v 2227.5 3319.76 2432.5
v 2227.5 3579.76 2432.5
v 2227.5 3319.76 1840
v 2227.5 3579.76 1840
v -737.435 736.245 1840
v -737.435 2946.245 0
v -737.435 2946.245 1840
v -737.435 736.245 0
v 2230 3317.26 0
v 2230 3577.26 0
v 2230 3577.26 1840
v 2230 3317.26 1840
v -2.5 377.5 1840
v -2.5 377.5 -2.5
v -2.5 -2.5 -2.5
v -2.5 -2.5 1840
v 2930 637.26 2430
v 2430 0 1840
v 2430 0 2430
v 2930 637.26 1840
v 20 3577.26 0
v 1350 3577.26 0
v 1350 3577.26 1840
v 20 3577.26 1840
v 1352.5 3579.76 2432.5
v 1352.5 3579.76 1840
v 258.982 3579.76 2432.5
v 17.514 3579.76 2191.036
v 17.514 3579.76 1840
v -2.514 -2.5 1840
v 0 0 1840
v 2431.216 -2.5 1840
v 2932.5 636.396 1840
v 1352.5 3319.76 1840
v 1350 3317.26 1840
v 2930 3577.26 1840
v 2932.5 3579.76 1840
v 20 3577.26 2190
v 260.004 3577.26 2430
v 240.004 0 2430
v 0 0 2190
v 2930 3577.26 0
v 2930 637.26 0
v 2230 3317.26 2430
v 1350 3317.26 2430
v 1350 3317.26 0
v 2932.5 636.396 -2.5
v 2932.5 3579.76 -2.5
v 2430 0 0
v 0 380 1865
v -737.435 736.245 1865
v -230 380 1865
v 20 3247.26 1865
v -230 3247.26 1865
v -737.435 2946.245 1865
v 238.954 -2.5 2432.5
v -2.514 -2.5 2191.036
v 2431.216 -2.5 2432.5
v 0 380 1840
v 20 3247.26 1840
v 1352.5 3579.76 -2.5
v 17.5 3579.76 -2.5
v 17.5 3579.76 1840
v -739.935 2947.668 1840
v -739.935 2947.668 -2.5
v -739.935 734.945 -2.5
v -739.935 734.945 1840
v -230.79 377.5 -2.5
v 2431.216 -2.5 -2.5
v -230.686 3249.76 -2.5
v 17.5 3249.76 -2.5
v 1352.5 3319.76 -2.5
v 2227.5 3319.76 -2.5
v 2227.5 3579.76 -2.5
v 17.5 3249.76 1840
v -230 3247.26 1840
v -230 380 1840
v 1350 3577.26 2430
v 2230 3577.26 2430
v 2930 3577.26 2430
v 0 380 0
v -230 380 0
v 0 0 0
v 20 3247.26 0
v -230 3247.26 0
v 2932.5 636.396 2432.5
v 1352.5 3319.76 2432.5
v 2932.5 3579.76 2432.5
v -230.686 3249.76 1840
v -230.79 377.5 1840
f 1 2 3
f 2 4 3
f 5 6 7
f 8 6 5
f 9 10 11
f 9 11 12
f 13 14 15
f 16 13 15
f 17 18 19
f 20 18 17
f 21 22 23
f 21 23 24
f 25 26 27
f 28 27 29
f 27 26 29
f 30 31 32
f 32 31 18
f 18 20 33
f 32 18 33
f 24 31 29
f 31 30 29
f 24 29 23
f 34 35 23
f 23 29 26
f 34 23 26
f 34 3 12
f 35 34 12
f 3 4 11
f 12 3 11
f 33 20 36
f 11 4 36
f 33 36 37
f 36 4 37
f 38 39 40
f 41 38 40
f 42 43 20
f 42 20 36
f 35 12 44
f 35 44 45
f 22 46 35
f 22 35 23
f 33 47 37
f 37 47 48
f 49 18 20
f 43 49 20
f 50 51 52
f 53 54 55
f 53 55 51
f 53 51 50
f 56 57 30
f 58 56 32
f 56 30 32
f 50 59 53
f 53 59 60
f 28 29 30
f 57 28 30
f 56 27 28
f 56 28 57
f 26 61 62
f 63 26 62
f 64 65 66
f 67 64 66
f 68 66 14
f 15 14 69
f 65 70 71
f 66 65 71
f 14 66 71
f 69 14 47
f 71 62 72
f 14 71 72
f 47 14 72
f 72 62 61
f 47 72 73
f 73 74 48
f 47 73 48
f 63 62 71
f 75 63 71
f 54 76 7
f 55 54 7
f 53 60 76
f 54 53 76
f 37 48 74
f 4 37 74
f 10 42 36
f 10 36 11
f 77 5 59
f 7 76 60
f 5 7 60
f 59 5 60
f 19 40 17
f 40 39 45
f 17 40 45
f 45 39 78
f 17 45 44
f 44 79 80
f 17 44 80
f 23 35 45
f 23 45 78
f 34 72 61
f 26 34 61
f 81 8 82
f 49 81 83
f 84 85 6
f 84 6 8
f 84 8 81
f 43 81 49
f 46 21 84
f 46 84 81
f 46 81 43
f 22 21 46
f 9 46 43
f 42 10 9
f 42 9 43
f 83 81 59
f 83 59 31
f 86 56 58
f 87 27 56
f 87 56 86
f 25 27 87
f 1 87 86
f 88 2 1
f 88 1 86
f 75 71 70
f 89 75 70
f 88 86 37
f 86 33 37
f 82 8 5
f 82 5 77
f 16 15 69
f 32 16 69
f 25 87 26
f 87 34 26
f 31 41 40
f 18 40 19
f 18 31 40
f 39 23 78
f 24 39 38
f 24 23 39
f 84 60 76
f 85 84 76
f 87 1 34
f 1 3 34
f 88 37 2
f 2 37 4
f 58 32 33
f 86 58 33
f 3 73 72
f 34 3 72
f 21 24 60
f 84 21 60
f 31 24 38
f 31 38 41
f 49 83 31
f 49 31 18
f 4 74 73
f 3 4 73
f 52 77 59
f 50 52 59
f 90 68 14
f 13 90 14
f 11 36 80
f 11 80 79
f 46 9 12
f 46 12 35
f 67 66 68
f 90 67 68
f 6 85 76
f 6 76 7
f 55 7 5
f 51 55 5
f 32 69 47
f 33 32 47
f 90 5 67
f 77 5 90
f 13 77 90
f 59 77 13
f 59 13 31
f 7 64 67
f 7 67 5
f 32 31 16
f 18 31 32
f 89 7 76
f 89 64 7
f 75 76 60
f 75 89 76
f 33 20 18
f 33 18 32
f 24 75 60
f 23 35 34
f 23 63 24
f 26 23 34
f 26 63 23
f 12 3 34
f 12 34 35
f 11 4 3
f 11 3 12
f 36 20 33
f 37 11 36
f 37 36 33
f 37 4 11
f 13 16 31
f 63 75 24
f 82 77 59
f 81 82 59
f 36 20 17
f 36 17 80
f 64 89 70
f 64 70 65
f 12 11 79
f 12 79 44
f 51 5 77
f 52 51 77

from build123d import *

# Parameters (mm, degrees)
F1_DEPTH = 1840
F3_DEPTH = 25
F5_DEPTH = 590
F6_SIZE2 = 240
F6_SIZE  = 240
F7_T     = 2.5
F8_T     = 2.5


with BuildPart() as f1:
    # F0 (on Top) → F1 (new body)
    with BuildSketch(Plane.XY):
        Polygon((0, 380), (0, 0), (2430, 0), (2930, 637.2597586542), (2930, 3577.2597586542), (2230, 3577.2597586542), (2230, 3317.2597586542), (1350, 3317.2597586542), (1350, 3577.2597586542), (20, 3577.2597586542), (20, 3247.2597586542), (-230, 3247.2597586542), (-737.4345606747, 2946.2445320744), (-737.4345606747, 736.2445320744), (-230, 380), align=None)
    extrude(amount=F1_DEPTH)

    # F7
    f7_openings = [f1.faces().sort_by_distance(p)[0] for p in [
        (1148.423993, 1782.531794, 1840),
    ]]
    offset(amount=F7_T, openings=f7_openings, kind=Kind.INTERSECTION)


with BuildPart() as f3:
    # F2 (on face) → F3 (new body)
    with BuildSketch(Plane.XY.offset(1840)):
        Polygon((0, 380), (20, 3247.2597586542), (-230, 3247.2597586542), (-737.4345606747, 2946.2445320744), (-737.4345606747, 736.2445320744), (-230, 380), align=None)
    extrude(amount=F3_DEPTH)


with BuildPart() as f5:
    # F4 (on face) → F5 (new body)
    with BuildSketch(Plane.XY.offset(1840)):
        Polygon((20, 3577.2597586542), (0, 0), (2430, 0), (2930, 637.2597586542), (2930, 3577.2597586542), (2230, 3577.2597586542), (2230, 3317.2597586542), (1350, 3317.2597586542), (1350, 3577.2597586542), align=None)
    extrude(amount=F5_DEPTH)

    # F6
    f6_edges = [f5.edges().sort_by_distance(p)[0] for p in [
        (10, 1788.629879, 2430),
    ]]
    chamfer(f6_edges, length=F6_SIZE, length2=F6_SIZE2)

    # F8
    f8_openings = [f5.faces().sort_by_distance(p)[0] for p in [
        (1442.227353, 1773.744575, 1840),
    ]]
    offset(amount=F8_T, openings=f8_openings, kind=Kind.INTERSECTION)


solid = Compound([f1.part, f3.part, f5.part])
